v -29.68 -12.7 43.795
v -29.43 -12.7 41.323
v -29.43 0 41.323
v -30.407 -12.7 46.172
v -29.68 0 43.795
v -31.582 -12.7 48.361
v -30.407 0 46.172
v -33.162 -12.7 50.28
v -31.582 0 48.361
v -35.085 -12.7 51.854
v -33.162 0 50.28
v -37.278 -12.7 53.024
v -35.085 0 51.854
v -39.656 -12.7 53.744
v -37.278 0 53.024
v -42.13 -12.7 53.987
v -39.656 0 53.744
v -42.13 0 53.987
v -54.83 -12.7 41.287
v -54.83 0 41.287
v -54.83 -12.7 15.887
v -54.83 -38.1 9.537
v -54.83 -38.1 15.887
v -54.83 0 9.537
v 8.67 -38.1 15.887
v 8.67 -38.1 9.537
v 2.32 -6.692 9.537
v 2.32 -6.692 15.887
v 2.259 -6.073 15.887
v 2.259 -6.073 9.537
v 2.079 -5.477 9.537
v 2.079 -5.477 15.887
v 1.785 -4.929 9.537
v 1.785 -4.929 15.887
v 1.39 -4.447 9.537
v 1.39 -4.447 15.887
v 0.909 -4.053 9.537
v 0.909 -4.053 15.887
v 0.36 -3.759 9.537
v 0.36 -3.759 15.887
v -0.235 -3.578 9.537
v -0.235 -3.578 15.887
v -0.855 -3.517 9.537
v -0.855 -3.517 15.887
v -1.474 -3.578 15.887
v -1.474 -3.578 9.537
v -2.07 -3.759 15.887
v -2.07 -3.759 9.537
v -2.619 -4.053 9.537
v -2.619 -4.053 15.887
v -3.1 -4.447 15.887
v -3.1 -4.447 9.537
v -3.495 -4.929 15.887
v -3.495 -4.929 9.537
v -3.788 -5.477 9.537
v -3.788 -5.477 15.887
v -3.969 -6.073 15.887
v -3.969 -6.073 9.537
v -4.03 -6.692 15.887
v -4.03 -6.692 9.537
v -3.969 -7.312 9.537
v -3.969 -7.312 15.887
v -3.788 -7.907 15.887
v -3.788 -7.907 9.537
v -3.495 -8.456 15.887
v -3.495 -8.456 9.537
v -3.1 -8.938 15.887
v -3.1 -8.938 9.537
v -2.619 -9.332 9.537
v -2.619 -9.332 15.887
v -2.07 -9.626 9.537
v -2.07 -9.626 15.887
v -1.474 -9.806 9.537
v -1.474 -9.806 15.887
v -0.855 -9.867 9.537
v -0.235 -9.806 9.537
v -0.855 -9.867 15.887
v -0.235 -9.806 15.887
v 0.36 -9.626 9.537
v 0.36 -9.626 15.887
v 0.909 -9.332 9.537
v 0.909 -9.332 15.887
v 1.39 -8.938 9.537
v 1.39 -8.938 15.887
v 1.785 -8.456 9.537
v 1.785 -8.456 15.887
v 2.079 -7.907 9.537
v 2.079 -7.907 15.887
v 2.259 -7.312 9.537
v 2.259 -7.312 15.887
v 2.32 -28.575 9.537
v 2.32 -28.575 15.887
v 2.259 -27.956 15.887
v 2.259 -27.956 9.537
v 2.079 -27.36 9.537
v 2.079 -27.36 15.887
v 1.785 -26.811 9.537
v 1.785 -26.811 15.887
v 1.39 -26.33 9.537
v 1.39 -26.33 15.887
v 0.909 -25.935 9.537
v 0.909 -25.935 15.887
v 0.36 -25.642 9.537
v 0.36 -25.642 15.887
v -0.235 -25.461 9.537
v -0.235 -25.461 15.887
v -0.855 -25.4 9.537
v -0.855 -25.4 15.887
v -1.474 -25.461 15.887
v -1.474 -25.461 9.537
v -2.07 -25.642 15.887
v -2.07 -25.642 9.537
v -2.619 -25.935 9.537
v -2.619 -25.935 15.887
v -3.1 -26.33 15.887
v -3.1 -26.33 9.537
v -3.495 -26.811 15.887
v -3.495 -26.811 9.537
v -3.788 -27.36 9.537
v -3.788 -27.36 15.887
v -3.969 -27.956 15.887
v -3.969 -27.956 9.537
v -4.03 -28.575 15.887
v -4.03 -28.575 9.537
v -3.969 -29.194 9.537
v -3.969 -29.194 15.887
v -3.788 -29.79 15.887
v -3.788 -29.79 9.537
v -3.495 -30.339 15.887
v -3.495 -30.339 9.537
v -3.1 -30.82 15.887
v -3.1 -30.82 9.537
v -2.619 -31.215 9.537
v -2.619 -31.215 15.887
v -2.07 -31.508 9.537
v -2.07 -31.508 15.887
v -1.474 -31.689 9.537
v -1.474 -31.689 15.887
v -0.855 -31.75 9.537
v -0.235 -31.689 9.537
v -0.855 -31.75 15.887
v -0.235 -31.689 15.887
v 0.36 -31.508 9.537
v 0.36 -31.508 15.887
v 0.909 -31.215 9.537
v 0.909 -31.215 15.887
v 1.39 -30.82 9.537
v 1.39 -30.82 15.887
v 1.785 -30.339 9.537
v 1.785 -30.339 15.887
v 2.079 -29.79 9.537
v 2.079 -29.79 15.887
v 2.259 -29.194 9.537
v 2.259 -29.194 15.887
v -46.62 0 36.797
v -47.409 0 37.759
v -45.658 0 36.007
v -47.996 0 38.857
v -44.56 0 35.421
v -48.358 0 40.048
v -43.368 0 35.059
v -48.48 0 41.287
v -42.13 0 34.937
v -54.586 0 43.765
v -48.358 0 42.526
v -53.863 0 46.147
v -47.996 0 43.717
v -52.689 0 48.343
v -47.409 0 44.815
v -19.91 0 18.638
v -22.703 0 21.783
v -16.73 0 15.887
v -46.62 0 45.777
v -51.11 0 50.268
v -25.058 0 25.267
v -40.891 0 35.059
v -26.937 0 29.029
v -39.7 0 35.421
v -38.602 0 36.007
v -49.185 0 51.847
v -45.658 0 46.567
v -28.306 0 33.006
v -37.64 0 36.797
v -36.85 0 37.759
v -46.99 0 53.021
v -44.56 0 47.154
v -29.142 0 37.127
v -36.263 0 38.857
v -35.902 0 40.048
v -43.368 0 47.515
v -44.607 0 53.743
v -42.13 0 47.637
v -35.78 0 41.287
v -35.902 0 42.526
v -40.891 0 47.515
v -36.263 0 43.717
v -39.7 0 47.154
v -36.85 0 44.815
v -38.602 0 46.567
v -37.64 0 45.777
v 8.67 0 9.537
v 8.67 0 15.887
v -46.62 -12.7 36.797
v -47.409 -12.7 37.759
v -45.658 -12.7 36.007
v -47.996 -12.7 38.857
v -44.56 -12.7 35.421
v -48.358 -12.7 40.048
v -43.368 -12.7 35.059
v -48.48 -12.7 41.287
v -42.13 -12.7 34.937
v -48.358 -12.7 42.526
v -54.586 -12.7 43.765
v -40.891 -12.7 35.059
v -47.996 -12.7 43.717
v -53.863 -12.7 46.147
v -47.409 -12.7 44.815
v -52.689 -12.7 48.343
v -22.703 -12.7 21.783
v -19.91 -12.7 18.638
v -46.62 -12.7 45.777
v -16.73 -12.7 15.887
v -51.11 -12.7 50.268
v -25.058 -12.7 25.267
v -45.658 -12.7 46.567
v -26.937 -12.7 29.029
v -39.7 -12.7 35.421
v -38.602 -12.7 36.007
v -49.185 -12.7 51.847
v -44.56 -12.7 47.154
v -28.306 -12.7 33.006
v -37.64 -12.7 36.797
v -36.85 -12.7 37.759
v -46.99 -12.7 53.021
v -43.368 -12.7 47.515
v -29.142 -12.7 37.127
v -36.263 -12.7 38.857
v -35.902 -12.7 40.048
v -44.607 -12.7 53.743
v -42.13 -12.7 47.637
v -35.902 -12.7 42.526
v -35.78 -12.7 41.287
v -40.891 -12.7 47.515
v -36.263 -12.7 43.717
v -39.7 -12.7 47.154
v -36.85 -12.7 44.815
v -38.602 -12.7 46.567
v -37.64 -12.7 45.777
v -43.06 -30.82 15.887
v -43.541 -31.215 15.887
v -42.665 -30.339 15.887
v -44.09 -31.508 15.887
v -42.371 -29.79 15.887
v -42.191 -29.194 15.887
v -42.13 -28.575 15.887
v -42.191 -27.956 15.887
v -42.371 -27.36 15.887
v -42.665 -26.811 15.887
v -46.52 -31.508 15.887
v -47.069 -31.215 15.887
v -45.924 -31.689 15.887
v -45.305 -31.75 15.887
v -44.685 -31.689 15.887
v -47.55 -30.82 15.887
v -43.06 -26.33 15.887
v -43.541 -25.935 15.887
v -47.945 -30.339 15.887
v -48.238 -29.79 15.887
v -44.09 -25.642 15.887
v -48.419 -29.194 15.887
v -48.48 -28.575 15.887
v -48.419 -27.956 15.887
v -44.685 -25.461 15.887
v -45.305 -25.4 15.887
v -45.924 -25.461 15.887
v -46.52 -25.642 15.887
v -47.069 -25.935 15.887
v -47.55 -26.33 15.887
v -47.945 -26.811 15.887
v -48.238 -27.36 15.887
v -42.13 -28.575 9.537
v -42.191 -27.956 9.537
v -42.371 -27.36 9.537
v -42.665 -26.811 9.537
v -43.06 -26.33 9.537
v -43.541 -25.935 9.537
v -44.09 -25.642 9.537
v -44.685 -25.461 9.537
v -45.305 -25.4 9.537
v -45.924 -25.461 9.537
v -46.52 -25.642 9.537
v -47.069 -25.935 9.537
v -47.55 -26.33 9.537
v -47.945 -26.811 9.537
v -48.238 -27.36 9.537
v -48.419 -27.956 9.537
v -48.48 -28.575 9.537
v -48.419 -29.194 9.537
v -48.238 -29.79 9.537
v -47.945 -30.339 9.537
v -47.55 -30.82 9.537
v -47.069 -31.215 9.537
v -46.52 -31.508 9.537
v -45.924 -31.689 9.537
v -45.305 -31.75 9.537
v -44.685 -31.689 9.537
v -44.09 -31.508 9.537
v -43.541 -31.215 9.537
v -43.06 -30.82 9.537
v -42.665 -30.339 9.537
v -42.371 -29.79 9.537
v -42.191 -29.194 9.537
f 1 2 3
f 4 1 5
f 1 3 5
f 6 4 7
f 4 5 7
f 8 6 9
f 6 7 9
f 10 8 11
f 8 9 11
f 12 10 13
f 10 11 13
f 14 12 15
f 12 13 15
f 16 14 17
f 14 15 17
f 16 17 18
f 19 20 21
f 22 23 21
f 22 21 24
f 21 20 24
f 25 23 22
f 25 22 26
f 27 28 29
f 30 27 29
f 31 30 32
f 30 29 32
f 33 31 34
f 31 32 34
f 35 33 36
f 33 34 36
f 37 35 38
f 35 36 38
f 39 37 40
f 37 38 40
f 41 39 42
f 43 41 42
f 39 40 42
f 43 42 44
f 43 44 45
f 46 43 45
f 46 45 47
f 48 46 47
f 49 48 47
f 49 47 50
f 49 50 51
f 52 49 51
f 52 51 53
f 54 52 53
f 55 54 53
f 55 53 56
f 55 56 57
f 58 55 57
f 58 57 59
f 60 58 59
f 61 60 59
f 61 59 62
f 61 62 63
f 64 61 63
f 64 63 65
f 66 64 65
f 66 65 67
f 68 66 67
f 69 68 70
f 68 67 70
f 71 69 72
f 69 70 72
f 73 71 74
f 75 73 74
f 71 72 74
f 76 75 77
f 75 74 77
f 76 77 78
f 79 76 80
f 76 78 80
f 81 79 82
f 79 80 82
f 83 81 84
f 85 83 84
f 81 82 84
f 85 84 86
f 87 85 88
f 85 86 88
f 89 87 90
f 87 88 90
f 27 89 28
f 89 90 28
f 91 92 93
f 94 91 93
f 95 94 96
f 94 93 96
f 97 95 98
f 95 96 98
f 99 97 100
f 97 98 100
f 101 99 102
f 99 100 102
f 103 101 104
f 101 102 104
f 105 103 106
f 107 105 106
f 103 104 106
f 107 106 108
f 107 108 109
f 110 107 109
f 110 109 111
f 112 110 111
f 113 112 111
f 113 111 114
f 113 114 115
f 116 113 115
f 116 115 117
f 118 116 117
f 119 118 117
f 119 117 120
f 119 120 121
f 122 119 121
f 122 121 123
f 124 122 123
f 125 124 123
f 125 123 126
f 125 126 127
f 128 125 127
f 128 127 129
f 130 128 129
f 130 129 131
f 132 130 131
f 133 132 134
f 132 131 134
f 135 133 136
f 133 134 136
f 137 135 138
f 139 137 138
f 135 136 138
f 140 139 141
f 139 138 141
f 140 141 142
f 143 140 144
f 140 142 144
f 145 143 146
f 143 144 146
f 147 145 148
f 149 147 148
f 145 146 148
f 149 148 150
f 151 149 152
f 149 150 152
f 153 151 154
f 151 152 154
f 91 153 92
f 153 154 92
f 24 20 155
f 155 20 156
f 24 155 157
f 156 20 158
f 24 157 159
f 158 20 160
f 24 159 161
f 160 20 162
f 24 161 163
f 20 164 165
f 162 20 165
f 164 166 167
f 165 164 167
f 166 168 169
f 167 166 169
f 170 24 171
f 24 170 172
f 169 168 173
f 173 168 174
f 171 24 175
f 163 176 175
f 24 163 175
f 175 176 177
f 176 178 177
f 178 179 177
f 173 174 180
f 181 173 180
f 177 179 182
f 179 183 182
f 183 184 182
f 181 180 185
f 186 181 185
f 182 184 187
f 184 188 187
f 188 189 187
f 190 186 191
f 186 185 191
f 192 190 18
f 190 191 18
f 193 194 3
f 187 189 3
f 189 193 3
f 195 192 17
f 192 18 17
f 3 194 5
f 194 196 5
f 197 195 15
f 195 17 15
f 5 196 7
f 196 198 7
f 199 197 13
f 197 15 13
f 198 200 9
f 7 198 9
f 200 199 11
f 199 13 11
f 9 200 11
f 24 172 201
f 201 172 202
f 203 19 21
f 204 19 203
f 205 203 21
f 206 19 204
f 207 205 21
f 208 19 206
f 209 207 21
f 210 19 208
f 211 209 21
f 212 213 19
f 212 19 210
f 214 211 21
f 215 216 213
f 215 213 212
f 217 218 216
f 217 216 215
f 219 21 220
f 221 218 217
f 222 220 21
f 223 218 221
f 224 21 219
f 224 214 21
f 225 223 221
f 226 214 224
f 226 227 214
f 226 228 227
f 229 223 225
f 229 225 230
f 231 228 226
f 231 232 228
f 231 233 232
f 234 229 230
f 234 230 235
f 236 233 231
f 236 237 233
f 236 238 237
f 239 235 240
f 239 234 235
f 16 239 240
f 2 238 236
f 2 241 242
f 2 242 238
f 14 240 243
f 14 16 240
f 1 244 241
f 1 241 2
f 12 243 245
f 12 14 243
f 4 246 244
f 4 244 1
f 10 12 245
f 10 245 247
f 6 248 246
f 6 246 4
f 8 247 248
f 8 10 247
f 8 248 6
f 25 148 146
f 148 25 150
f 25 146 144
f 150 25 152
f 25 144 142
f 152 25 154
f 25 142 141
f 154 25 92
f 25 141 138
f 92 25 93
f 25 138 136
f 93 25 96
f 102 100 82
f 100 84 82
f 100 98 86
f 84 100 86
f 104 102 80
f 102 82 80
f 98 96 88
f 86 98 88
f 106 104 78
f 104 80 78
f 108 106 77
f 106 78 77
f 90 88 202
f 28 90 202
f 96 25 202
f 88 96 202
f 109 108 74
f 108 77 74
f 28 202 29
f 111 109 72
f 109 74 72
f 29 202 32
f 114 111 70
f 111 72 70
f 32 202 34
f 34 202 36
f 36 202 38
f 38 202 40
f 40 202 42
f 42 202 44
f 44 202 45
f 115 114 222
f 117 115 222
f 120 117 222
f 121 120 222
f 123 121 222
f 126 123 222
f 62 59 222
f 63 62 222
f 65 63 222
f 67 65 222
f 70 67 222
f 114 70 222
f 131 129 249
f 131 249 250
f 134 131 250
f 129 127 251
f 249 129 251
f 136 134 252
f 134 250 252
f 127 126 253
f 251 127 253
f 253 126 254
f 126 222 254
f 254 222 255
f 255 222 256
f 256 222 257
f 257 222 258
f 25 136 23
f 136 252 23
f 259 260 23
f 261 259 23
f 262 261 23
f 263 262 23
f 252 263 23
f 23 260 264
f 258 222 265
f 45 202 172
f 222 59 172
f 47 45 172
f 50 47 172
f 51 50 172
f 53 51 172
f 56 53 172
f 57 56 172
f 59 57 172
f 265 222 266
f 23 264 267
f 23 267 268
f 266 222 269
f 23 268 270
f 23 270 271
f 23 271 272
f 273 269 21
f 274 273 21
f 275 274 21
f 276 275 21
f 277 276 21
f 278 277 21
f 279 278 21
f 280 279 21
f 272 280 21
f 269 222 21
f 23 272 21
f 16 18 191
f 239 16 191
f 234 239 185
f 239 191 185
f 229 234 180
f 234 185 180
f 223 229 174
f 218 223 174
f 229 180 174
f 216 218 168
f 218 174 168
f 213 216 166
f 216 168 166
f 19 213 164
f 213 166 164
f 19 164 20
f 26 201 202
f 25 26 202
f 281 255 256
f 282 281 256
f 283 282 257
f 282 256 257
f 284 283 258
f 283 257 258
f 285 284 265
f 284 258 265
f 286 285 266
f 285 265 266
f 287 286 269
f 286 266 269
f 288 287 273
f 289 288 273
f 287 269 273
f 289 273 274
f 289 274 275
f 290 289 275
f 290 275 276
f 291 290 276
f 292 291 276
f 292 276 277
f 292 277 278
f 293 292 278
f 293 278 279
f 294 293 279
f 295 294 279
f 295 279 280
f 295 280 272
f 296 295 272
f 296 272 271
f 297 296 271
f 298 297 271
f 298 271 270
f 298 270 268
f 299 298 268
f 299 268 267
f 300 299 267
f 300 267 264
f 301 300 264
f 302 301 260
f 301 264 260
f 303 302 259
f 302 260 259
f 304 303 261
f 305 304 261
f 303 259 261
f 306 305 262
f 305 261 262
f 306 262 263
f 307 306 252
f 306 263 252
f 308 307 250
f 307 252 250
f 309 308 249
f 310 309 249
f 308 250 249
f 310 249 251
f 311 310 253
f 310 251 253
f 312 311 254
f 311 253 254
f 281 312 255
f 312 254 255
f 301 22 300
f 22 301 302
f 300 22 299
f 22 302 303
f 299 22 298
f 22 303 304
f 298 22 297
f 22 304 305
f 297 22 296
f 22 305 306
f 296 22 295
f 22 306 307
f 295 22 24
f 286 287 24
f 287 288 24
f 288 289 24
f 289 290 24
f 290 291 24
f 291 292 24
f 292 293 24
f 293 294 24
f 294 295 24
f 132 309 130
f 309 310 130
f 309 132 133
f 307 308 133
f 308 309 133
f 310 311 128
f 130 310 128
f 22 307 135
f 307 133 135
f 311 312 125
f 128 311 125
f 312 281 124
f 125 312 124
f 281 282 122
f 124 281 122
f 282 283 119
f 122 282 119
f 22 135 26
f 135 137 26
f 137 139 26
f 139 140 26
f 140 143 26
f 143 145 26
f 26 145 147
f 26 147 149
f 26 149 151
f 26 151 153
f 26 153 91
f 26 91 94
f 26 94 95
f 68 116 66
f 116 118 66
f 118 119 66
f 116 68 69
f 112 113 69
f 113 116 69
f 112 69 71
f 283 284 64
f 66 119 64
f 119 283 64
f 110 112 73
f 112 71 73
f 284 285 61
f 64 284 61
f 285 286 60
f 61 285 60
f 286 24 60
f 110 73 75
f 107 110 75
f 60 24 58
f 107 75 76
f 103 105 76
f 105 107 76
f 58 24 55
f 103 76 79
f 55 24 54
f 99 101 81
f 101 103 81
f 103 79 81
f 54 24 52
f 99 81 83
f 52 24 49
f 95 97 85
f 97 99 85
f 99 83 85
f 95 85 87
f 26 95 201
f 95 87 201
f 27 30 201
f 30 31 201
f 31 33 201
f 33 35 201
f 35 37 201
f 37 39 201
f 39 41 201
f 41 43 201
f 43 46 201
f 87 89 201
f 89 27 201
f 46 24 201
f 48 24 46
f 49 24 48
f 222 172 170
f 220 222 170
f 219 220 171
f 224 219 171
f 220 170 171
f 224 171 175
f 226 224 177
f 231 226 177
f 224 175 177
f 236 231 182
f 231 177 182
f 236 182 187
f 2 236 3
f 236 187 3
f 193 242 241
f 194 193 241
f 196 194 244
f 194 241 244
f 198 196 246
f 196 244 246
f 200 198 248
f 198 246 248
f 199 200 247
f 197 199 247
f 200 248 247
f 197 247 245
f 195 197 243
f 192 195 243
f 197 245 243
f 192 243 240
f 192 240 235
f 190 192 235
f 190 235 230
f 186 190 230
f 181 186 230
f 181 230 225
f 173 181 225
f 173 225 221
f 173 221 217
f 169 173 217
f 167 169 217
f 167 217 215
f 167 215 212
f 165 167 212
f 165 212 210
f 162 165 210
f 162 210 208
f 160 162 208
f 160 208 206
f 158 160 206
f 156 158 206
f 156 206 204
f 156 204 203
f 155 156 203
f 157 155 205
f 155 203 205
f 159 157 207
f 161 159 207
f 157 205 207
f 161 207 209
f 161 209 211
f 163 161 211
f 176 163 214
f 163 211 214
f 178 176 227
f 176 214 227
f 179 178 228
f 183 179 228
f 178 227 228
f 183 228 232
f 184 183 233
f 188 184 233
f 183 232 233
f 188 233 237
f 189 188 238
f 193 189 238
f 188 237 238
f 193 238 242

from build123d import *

# Parameters (mm, degrees)
F1_DEPTH = 38.1
F3_DEPTH = 25.4
F4_R     = 6.35
F5_DEPTH = 12.701
F6_R     = 3.175
F7_DEPTH = 6.351


with BuildPart() as f1:
    # F0 (on Front) → F1 (new body)
    with BuildSketch(Plane.XZ):
        with BuildLine():
            ThreePointArc((-42.129658, 53.987246), (-51.109914, 50.267503), (-54.829658, 41.287246))
            Line((-54.829658, 41.287246), (-54.829658, 9.537246))
            Line((-54.829658, 9.537246), (8.670342, 9.537246))
            Line((8.670342, 9.537246), (8.670342, 15.887246))
            Line((8.670342, 15.887246), (-16.729658, 15.887246))
            ThreePointArc((-16.729658, 15.887246), (-26.059538, 27.117037), (-29.429707, 41.322558))
            ThreePointArc((-29.429707, 41.322558), (-33.161895, 50.279978), (-42.129658, 53.987246))
        make_face()
    extrude(amount=F1_DEPTH)

    # F2 (on face) → F3 (cut)
    with BuildSketch(Plane.XZ.offset(38.1)):
        with BuildLine():
            Line((-54.829658, 15.887246), (-16.729658, 15.887246))
            ThreePointArc((-16.729658, 15.887246), (-26.059538, 27.117037), (-29.429707, 41.322558))
            ThreePointArc((-29.429707, 41.322558), (-42.147313, 53.987234), (-54.829658, 41.287246))
            Line((-54.829658, 41.287246), (-54.829658, 15.887246))
        make_face()
    extrude(amount=-F3_DEPTH, mode=Mode.SUBTRACT)

    # F4 (on face) → F5 (cut, through all)
    with BuildSketch(Plane.XZ.offset(12.7)):
        with Locations((-42.129658, 41.287246)):
            Circle(F4_R)
    extrude(amount=-F5_DEPTH, mode=Mode.SUBTRACT)

    # F6 (on face) → F7 (cut, through all)
    with BuildSketch(Plane.XY.offset(15.887246)):
        with Locations((-0.854658, -6.692464)):
            Circle(F6_R)
        with Locations((-0.854658, -28.575)):
            Circle(F6_R)
        with Locations((-45.304658, -28.575)):
            Circle(F6_R)
    extrude(amount=-F7_DEPTH, mode=Mode.SUBTRACT)


solid = f1.part
